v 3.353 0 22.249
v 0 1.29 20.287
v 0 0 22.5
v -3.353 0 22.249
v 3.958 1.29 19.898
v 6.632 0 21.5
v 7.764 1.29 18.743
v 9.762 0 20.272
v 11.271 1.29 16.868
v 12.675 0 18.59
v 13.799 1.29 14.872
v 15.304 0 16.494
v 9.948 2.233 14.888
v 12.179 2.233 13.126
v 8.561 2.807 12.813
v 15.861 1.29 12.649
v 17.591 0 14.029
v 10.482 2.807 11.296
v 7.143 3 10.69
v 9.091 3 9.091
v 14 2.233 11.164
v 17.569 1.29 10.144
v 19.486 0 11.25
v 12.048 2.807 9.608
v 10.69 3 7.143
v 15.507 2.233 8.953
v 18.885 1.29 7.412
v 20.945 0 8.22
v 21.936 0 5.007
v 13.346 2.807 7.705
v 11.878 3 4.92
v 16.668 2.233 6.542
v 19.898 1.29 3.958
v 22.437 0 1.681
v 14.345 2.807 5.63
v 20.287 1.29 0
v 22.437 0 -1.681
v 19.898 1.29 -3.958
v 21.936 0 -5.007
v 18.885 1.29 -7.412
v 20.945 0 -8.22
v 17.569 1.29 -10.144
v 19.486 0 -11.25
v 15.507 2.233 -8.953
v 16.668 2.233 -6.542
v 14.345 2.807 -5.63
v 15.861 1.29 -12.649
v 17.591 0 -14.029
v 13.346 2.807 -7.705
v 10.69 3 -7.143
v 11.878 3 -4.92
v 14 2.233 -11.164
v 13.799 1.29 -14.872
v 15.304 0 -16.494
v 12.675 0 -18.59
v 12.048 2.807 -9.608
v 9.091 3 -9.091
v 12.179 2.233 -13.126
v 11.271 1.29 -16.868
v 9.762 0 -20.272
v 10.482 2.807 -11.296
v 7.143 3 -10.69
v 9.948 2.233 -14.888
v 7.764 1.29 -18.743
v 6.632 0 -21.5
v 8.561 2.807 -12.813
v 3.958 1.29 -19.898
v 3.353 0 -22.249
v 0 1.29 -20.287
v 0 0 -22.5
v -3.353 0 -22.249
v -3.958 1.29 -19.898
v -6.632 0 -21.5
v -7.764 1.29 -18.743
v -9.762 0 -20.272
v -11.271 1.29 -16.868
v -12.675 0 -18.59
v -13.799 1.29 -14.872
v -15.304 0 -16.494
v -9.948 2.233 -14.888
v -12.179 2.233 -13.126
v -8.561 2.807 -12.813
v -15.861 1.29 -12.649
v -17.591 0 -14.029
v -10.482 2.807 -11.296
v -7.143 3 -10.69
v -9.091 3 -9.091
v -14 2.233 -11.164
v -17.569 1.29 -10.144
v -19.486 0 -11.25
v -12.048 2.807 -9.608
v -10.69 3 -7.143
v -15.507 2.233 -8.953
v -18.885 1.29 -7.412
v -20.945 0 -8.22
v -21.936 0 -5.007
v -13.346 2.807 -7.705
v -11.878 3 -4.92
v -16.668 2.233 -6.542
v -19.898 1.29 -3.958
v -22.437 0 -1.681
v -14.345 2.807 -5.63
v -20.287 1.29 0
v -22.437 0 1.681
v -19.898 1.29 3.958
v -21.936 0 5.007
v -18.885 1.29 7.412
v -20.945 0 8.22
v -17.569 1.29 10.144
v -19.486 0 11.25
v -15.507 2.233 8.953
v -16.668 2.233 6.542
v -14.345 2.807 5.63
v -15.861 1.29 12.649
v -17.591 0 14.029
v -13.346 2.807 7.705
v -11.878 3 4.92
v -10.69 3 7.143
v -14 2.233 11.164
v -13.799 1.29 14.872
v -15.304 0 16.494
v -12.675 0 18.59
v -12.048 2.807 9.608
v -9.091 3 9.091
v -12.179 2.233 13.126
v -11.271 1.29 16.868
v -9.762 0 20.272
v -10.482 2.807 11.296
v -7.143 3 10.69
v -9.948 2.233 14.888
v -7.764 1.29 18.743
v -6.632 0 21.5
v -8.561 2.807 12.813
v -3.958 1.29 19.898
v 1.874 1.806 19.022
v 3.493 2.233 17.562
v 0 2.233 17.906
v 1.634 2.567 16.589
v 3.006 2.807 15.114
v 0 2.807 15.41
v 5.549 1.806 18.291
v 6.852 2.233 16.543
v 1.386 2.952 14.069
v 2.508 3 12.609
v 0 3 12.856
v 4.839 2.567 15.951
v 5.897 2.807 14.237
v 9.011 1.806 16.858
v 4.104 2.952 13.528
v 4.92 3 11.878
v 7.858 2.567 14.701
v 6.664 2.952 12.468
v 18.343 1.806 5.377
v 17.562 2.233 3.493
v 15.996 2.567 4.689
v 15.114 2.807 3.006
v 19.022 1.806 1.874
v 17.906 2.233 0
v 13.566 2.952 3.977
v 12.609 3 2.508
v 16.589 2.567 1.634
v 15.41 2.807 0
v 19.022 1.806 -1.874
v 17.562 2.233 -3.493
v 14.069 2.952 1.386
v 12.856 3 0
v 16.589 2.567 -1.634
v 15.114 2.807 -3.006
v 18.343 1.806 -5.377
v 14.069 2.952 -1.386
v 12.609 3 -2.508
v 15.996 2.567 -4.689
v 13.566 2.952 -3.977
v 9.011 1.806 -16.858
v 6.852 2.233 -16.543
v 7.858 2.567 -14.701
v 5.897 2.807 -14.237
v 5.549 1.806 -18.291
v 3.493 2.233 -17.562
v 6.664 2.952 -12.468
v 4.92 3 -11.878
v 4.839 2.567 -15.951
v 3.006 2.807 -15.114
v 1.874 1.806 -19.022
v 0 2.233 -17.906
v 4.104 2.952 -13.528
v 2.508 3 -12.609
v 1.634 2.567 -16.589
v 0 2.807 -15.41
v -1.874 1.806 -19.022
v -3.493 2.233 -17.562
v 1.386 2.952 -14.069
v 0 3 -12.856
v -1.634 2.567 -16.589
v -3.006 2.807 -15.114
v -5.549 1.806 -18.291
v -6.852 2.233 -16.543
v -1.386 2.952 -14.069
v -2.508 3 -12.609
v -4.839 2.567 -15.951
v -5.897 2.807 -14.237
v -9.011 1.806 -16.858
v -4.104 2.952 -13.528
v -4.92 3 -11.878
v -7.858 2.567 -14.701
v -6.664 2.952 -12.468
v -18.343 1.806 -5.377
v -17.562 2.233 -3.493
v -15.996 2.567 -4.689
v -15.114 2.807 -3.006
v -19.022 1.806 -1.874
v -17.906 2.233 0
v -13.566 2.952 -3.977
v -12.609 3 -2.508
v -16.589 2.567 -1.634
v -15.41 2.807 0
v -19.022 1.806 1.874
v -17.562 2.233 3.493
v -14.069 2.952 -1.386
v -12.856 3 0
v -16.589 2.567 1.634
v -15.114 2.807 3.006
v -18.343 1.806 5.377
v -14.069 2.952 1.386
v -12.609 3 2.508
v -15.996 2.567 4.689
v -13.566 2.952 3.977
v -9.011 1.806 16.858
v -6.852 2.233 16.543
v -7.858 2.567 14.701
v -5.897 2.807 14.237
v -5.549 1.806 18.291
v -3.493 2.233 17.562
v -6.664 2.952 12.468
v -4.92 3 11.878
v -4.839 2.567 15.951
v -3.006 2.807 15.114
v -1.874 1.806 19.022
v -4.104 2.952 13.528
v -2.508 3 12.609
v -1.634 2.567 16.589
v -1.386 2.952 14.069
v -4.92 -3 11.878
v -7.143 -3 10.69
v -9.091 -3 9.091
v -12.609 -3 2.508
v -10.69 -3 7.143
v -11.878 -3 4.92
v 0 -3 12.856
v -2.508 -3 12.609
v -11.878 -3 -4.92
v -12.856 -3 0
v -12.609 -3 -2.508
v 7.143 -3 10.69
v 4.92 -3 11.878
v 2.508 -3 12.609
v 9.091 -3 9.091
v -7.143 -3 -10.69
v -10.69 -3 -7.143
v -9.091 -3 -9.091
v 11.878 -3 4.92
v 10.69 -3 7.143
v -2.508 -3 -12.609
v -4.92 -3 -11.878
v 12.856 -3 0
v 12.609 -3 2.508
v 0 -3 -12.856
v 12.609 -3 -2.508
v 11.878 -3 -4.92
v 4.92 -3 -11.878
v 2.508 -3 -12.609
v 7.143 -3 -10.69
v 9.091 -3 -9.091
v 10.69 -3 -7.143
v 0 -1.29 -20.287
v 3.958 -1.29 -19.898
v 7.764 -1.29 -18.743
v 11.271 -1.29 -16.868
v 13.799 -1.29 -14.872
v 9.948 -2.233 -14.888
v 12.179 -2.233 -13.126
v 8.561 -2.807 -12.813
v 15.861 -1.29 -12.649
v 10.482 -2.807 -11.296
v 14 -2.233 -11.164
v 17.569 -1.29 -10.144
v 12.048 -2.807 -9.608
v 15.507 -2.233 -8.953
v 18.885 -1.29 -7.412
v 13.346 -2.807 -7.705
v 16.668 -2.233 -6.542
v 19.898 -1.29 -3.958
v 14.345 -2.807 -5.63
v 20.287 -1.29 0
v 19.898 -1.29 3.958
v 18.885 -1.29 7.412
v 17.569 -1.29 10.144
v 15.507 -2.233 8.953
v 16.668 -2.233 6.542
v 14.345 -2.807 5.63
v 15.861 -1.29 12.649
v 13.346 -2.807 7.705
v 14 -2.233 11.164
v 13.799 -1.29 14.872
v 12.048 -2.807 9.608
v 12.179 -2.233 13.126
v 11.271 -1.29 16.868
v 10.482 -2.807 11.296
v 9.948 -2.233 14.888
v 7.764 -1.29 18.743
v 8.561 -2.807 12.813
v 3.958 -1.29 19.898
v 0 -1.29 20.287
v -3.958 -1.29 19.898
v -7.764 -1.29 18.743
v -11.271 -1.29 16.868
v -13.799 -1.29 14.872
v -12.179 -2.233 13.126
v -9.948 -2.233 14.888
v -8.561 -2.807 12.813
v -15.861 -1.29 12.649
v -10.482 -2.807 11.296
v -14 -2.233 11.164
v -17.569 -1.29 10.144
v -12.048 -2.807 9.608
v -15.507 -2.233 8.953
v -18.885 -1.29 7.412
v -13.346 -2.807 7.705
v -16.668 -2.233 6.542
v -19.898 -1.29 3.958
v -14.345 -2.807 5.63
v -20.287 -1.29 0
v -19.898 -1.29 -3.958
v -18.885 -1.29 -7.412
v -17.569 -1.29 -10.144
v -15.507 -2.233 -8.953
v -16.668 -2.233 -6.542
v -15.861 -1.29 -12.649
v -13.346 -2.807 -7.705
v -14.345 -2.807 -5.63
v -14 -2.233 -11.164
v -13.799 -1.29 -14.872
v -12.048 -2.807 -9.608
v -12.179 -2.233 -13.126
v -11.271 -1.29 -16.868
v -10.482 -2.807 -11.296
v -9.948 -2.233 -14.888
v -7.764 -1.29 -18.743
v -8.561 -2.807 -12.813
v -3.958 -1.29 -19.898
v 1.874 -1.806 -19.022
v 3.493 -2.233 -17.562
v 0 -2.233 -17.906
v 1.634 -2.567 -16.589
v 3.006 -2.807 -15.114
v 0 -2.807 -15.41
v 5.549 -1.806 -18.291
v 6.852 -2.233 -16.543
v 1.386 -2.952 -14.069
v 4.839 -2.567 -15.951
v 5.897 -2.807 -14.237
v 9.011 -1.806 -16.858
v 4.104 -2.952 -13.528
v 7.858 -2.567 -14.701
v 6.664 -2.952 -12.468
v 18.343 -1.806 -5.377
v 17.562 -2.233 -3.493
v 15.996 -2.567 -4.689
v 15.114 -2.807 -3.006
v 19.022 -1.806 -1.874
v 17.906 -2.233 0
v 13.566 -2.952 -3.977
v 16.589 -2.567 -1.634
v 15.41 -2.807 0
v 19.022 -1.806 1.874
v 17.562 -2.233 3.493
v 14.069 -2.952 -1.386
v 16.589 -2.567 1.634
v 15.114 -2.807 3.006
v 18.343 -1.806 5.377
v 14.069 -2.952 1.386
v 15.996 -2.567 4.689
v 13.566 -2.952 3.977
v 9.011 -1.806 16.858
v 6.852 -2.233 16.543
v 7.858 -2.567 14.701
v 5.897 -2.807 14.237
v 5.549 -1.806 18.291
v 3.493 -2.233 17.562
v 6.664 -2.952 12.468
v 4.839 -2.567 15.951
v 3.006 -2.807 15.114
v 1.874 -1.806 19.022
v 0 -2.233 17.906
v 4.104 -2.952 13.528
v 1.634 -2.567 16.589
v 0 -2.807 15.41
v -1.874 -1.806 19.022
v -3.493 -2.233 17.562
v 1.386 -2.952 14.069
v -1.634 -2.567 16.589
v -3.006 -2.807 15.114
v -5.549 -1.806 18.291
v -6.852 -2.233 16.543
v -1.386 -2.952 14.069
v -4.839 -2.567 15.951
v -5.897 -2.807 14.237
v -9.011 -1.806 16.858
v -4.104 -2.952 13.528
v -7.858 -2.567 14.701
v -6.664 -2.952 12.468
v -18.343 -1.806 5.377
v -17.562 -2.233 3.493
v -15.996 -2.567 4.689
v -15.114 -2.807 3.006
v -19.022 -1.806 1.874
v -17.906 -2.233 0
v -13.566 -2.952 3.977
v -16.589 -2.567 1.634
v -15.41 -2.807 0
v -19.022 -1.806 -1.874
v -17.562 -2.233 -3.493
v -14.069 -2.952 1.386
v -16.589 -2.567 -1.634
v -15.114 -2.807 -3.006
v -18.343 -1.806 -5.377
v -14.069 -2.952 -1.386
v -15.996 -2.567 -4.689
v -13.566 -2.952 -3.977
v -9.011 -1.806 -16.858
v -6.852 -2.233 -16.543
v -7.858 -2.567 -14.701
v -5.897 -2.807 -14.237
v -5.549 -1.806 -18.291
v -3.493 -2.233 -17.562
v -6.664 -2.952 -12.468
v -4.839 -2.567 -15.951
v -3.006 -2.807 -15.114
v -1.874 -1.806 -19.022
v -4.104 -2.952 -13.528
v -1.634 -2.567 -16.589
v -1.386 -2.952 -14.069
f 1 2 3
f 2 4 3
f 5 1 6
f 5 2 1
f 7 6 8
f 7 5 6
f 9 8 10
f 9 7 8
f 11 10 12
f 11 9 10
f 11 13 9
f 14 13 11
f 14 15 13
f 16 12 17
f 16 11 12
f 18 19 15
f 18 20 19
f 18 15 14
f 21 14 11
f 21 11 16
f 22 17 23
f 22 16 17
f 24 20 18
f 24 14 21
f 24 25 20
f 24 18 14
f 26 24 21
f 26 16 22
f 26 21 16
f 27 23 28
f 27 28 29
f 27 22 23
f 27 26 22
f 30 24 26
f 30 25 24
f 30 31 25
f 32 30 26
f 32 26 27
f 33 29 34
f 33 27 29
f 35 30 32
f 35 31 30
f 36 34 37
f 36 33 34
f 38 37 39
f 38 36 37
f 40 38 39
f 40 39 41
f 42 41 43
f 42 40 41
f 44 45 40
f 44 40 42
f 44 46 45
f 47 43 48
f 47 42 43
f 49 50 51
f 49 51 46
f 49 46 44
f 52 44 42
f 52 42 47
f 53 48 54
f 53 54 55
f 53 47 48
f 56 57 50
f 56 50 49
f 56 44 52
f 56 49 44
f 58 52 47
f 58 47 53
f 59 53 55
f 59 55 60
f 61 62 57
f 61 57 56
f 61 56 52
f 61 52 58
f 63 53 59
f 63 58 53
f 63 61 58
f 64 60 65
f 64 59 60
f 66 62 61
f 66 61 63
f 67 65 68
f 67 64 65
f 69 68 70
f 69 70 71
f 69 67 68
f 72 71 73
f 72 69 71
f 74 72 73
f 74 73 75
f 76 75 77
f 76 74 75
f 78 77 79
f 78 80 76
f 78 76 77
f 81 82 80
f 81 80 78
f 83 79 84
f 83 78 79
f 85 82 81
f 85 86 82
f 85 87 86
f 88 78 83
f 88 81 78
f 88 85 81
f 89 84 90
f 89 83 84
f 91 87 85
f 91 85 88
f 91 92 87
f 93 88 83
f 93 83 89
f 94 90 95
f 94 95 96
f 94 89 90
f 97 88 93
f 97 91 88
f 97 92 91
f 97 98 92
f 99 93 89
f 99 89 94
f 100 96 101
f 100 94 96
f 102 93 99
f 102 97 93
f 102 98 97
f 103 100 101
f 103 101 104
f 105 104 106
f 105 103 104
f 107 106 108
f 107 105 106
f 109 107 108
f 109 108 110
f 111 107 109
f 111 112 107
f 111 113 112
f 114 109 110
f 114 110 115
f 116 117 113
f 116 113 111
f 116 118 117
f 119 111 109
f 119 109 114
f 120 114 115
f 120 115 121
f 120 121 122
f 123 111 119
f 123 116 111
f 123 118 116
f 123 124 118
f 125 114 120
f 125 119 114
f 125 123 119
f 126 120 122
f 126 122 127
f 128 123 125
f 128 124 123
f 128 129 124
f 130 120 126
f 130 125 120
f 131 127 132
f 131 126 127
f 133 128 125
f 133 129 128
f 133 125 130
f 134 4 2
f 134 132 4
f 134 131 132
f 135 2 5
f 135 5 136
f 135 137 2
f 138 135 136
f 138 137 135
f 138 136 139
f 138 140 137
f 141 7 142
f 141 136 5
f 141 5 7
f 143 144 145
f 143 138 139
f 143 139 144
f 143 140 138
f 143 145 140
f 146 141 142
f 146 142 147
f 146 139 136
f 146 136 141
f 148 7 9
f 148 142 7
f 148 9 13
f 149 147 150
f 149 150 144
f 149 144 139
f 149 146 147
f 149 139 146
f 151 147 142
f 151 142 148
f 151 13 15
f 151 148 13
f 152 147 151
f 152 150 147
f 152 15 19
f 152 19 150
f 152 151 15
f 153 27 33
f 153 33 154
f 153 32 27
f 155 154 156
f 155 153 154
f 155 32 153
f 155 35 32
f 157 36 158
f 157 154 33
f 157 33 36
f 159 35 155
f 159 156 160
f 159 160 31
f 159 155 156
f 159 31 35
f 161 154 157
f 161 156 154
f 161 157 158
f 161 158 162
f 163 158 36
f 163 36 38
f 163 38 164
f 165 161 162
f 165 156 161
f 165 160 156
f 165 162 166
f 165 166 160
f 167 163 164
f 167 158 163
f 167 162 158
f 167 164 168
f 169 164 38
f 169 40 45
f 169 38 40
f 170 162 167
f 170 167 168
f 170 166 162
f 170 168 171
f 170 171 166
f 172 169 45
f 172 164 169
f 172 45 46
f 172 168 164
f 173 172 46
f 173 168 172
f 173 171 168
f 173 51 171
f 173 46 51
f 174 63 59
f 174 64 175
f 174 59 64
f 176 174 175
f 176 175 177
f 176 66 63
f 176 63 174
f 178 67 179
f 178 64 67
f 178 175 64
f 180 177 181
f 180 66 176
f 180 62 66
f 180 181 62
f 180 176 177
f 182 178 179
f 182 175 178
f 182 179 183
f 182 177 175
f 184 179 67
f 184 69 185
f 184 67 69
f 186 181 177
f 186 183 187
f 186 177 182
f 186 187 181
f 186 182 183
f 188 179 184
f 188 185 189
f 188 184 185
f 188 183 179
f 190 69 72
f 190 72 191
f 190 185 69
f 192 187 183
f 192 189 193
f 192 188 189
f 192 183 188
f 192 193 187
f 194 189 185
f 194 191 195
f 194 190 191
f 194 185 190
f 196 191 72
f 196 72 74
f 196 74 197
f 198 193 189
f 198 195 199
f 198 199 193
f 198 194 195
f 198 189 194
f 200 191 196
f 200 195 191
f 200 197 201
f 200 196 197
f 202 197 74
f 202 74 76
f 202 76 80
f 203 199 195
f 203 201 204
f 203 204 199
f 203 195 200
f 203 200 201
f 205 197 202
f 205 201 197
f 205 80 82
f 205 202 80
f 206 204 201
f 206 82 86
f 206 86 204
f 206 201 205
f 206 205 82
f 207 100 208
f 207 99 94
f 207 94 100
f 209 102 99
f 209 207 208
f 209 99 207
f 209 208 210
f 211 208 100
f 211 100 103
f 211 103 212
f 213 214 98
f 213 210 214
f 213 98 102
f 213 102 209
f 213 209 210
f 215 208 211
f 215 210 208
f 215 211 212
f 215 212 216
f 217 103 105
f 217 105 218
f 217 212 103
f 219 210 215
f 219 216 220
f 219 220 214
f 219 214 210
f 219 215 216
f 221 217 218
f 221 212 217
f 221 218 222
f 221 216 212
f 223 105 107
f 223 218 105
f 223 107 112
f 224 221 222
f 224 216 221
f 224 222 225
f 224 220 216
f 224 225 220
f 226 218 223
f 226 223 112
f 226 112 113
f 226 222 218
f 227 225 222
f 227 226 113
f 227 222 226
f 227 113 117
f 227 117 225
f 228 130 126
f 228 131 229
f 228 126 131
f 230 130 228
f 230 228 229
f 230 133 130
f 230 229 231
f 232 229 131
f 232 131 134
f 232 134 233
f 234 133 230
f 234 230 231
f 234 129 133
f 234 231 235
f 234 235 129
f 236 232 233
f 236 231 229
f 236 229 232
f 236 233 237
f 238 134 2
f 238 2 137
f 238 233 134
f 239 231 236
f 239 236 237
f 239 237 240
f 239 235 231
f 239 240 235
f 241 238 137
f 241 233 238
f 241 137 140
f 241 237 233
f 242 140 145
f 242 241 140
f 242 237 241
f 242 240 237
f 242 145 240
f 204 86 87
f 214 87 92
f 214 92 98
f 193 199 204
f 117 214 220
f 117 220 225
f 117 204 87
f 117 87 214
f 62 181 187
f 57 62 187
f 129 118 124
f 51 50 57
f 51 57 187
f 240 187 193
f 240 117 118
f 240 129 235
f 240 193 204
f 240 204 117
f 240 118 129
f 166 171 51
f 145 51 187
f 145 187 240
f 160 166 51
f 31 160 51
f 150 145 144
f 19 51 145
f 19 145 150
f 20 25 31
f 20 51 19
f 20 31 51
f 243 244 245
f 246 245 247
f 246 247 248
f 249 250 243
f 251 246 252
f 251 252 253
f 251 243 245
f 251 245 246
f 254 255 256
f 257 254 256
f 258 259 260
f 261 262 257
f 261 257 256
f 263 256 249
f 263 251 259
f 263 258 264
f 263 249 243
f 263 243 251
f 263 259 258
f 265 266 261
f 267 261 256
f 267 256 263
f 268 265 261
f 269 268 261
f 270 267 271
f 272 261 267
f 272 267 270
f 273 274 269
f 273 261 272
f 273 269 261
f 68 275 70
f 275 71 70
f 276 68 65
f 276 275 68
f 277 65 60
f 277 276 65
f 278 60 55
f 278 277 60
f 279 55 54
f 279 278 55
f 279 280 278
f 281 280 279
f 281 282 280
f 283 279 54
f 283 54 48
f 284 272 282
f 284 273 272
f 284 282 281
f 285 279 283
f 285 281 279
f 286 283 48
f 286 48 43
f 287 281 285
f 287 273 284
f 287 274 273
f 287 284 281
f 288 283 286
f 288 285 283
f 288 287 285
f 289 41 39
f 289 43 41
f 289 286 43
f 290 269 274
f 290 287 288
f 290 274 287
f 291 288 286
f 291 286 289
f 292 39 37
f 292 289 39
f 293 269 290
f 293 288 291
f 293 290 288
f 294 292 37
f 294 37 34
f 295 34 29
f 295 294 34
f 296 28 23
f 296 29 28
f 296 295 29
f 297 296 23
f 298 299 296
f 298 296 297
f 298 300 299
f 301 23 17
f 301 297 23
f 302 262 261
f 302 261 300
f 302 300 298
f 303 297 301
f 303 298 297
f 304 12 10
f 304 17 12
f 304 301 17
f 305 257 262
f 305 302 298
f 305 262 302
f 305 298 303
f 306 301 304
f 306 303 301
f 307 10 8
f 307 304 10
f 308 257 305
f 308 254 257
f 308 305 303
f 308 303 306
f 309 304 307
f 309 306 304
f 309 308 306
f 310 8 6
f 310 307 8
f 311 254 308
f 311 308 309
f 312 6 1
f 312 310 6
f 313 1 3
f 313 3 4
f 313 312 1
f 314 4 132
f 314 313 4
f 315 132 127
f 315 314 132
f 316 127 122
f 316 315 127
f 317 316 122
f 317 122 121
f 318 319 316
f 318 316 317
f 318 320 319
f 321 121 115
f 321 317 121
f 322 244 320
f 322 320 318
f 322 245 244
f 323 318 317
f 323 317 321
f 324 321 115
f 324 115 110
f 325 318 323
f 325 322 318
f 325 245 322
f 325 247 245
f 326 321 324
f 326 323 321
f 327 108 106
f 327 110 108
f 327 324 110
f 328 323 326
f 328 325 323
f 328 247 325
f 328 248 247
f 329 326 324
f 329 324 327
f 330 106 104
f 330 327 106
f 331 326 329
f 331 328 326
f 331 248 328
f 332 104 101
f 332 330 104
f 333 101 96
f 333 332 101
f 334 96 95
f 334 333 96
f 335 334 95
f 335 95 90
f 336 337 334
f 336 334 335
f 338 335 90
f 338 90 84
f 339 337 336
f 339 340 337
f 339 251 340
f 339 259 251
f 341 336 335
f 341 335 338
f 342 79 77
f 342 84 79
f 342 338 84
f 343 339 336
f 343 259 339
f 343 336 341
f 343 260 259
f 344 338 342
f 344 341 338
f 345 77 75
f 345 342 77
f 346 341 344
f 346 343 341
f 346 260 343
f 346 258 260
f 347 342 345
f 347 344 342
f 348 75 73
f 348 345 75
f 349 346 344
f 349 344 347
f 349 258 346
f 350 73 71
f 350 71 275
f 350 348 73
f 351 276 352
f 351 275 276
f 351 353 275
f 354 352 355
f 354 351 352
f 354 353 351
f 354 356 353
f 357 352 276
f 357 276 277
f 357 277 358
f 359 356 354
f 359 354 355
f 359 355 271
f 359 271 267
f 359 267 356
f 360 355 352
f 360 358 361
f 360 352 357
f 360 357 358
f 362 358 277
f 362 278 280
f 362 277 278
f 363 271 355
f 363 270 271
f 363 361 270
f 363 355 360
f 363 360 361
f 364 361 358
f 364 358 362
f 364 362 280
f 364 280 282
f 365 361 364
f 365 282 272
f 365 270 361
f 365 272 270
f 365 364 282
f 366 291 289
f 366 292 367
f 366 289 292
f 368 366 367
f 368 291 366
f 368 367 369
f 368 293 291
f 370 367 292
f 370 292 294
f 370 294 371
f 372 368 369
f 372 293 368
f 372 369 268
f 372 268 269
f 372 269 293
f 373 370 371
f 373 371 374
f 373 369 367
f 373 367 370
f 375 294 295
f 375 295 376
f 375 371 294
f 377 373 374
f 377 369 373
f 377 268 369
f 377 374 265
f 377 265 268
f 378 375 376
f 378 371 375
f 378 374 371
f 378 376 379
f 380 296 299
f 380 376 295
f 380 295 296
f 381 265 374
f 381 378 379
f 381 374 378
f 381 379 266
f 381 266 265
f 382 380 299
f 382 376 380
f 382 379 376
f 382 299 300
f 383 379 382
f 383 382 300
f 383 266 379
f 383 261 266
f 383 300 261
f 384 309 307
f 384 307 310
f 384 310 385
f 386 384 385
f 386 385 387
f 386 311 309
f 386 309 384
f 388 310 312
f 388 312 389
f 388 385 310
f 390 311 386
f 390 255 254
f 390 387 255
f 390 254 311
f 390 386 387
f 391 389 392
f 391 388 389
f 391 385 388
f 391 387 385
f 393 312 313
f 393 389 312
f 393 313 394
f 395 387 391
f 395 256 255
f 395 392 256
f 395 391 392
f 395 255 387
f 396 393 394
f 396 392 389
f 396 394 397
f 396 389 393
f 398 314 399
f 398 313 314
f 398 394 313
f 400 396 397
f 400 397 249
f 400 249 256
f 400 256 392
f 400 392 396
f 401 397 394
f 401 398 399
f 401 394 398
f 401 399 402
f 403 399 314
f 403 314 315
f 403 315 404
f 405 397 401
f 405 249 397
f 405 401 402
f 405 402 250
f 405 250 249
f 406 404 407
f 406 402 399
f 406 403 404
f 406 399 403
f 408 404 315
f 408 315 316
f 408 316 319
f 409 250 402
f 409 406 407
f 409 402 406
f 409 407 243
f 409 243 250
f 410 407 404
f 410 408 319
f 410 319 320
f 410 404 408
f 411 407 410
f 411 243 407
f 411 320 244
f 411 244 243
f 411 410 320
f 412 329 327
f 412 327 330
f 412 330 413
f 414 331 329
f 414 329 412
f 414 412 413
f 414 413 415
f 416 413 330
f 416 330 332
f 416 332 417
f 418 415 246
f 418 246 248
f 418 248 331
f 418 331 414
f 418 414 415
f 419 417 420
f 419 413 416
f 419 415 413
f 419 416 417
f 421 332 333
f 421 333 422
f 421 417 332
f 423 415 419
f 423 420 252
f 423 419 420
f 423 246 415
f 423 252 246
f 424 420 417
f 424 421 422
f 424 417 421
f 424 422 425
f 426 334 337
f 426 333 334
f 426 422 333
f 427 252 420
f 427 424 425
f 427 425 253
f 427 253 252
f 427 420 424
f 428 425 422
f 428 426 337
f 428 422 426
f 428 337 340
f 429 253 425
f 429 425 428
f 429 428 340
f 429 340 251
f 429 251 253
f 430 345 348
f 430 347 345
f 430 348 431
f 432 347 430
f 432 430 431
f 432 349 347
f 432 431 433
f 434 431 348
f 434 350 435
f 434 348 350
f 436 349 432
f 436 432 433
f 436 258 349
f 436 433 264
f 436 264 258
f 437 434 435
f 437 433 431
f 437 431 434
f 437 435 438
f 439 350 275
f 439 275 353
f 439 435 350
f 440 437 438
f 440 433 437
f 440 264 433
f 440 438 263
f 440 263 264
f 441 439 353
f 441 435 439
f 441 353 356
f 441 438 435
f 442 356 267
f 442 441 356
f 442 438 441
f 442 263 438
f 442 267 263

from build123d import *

# Parameters (mm, degrees)
SKETCH_1_R      = 22.5
EXTRUDE_5_DEPTH = 3
FILLET_3_R      = 17
SKETCH_4_R      = 22.5
EXTRUDE_6_DEPTH = 3
FILLET_4_R      = 17


with BuildPart() as part:
    # 草图1 → 凸台-拉伸5 (new body)
    with BuildSketch(Plane(origin=(0, 0, 0), x_dir=(1, 0, 0), z_dir=(0, 1, 0))):
        with Locations(Location((0, 0, 0), (0, 0, 270))):
            Circle(SKETCH_1_R)
    extrude(amount=EXTRUDE_5_DEPTH)

    # 圆角3
    # the kernel refuses this fillet: 17 mm, written as the material it takes off along each edge
    with BuildSketch(Plane(origin=(0, 3, 0), x_dir=(0, 0, 1), z_dir=(-1, 0, 0))) as fillet_3_piece_1:
        with BuildLine():
            CenterArc((12.856349239, -17), FILLET_3_R, 55.43967822, 34.56032178)
            Line((12.856349239, 0), (12.856349239, 0.34))
            Line((12.856349239, 0.34), (22.5, 0.34))
            Line((22.5, 0.34), (22.84, 0))
            ThreePointArc((22.84, 0), (22.84, -1.5), (22.692873015, -2.72))
            Line((22.692873015, -2.72), (22.5, -3))
        make_face()
    revolve(axis=Axis((0, 3, 0), (0, 1, 0)), mode=Mode.SUBTRACT)

    # 草图4 → 凸台-拉伸6 (add)
    with BuildSketch(Plane.XZ):
        with Locations(Location((0, 0, 0), (0, 0, 270))):
            Circle(SKETCH_4_R)
    extrude(amount=EXTRUDE_6_DEPTH)

    # 圆角4
    # the kernel refuses this fillet: 17 mm, written as the material it takes off along each edge
    with BuildSketch(Plane(origin=(0, -3, 0), x_dir=(0, 0, -1), z_dir=(-1, 0, 0))) as fillet_4_piece_1:
        with BuildLine():
            CenterArc((12.856349239, -17), FILLET_4_R, 55.43967822, 34.56032178)
            Line((12.856349239, 0), (12.856349239, 0.34))
            Line((12.856349239, 0.34), (22.5, 0.34))
            Line((22.5, 0.34), (22.84, 0))
            ThreePointArc((22.84, 0), (22.84, -1.5), (22.692873015, -2.72))
            Line((22.692873015, -2.72), (22.5, -3))
        make_face()
    revolve(axis=Axis((0, -3, 0), (0, -1, 0)), mode=Mode.SUBTRACT)


solid = part.part
